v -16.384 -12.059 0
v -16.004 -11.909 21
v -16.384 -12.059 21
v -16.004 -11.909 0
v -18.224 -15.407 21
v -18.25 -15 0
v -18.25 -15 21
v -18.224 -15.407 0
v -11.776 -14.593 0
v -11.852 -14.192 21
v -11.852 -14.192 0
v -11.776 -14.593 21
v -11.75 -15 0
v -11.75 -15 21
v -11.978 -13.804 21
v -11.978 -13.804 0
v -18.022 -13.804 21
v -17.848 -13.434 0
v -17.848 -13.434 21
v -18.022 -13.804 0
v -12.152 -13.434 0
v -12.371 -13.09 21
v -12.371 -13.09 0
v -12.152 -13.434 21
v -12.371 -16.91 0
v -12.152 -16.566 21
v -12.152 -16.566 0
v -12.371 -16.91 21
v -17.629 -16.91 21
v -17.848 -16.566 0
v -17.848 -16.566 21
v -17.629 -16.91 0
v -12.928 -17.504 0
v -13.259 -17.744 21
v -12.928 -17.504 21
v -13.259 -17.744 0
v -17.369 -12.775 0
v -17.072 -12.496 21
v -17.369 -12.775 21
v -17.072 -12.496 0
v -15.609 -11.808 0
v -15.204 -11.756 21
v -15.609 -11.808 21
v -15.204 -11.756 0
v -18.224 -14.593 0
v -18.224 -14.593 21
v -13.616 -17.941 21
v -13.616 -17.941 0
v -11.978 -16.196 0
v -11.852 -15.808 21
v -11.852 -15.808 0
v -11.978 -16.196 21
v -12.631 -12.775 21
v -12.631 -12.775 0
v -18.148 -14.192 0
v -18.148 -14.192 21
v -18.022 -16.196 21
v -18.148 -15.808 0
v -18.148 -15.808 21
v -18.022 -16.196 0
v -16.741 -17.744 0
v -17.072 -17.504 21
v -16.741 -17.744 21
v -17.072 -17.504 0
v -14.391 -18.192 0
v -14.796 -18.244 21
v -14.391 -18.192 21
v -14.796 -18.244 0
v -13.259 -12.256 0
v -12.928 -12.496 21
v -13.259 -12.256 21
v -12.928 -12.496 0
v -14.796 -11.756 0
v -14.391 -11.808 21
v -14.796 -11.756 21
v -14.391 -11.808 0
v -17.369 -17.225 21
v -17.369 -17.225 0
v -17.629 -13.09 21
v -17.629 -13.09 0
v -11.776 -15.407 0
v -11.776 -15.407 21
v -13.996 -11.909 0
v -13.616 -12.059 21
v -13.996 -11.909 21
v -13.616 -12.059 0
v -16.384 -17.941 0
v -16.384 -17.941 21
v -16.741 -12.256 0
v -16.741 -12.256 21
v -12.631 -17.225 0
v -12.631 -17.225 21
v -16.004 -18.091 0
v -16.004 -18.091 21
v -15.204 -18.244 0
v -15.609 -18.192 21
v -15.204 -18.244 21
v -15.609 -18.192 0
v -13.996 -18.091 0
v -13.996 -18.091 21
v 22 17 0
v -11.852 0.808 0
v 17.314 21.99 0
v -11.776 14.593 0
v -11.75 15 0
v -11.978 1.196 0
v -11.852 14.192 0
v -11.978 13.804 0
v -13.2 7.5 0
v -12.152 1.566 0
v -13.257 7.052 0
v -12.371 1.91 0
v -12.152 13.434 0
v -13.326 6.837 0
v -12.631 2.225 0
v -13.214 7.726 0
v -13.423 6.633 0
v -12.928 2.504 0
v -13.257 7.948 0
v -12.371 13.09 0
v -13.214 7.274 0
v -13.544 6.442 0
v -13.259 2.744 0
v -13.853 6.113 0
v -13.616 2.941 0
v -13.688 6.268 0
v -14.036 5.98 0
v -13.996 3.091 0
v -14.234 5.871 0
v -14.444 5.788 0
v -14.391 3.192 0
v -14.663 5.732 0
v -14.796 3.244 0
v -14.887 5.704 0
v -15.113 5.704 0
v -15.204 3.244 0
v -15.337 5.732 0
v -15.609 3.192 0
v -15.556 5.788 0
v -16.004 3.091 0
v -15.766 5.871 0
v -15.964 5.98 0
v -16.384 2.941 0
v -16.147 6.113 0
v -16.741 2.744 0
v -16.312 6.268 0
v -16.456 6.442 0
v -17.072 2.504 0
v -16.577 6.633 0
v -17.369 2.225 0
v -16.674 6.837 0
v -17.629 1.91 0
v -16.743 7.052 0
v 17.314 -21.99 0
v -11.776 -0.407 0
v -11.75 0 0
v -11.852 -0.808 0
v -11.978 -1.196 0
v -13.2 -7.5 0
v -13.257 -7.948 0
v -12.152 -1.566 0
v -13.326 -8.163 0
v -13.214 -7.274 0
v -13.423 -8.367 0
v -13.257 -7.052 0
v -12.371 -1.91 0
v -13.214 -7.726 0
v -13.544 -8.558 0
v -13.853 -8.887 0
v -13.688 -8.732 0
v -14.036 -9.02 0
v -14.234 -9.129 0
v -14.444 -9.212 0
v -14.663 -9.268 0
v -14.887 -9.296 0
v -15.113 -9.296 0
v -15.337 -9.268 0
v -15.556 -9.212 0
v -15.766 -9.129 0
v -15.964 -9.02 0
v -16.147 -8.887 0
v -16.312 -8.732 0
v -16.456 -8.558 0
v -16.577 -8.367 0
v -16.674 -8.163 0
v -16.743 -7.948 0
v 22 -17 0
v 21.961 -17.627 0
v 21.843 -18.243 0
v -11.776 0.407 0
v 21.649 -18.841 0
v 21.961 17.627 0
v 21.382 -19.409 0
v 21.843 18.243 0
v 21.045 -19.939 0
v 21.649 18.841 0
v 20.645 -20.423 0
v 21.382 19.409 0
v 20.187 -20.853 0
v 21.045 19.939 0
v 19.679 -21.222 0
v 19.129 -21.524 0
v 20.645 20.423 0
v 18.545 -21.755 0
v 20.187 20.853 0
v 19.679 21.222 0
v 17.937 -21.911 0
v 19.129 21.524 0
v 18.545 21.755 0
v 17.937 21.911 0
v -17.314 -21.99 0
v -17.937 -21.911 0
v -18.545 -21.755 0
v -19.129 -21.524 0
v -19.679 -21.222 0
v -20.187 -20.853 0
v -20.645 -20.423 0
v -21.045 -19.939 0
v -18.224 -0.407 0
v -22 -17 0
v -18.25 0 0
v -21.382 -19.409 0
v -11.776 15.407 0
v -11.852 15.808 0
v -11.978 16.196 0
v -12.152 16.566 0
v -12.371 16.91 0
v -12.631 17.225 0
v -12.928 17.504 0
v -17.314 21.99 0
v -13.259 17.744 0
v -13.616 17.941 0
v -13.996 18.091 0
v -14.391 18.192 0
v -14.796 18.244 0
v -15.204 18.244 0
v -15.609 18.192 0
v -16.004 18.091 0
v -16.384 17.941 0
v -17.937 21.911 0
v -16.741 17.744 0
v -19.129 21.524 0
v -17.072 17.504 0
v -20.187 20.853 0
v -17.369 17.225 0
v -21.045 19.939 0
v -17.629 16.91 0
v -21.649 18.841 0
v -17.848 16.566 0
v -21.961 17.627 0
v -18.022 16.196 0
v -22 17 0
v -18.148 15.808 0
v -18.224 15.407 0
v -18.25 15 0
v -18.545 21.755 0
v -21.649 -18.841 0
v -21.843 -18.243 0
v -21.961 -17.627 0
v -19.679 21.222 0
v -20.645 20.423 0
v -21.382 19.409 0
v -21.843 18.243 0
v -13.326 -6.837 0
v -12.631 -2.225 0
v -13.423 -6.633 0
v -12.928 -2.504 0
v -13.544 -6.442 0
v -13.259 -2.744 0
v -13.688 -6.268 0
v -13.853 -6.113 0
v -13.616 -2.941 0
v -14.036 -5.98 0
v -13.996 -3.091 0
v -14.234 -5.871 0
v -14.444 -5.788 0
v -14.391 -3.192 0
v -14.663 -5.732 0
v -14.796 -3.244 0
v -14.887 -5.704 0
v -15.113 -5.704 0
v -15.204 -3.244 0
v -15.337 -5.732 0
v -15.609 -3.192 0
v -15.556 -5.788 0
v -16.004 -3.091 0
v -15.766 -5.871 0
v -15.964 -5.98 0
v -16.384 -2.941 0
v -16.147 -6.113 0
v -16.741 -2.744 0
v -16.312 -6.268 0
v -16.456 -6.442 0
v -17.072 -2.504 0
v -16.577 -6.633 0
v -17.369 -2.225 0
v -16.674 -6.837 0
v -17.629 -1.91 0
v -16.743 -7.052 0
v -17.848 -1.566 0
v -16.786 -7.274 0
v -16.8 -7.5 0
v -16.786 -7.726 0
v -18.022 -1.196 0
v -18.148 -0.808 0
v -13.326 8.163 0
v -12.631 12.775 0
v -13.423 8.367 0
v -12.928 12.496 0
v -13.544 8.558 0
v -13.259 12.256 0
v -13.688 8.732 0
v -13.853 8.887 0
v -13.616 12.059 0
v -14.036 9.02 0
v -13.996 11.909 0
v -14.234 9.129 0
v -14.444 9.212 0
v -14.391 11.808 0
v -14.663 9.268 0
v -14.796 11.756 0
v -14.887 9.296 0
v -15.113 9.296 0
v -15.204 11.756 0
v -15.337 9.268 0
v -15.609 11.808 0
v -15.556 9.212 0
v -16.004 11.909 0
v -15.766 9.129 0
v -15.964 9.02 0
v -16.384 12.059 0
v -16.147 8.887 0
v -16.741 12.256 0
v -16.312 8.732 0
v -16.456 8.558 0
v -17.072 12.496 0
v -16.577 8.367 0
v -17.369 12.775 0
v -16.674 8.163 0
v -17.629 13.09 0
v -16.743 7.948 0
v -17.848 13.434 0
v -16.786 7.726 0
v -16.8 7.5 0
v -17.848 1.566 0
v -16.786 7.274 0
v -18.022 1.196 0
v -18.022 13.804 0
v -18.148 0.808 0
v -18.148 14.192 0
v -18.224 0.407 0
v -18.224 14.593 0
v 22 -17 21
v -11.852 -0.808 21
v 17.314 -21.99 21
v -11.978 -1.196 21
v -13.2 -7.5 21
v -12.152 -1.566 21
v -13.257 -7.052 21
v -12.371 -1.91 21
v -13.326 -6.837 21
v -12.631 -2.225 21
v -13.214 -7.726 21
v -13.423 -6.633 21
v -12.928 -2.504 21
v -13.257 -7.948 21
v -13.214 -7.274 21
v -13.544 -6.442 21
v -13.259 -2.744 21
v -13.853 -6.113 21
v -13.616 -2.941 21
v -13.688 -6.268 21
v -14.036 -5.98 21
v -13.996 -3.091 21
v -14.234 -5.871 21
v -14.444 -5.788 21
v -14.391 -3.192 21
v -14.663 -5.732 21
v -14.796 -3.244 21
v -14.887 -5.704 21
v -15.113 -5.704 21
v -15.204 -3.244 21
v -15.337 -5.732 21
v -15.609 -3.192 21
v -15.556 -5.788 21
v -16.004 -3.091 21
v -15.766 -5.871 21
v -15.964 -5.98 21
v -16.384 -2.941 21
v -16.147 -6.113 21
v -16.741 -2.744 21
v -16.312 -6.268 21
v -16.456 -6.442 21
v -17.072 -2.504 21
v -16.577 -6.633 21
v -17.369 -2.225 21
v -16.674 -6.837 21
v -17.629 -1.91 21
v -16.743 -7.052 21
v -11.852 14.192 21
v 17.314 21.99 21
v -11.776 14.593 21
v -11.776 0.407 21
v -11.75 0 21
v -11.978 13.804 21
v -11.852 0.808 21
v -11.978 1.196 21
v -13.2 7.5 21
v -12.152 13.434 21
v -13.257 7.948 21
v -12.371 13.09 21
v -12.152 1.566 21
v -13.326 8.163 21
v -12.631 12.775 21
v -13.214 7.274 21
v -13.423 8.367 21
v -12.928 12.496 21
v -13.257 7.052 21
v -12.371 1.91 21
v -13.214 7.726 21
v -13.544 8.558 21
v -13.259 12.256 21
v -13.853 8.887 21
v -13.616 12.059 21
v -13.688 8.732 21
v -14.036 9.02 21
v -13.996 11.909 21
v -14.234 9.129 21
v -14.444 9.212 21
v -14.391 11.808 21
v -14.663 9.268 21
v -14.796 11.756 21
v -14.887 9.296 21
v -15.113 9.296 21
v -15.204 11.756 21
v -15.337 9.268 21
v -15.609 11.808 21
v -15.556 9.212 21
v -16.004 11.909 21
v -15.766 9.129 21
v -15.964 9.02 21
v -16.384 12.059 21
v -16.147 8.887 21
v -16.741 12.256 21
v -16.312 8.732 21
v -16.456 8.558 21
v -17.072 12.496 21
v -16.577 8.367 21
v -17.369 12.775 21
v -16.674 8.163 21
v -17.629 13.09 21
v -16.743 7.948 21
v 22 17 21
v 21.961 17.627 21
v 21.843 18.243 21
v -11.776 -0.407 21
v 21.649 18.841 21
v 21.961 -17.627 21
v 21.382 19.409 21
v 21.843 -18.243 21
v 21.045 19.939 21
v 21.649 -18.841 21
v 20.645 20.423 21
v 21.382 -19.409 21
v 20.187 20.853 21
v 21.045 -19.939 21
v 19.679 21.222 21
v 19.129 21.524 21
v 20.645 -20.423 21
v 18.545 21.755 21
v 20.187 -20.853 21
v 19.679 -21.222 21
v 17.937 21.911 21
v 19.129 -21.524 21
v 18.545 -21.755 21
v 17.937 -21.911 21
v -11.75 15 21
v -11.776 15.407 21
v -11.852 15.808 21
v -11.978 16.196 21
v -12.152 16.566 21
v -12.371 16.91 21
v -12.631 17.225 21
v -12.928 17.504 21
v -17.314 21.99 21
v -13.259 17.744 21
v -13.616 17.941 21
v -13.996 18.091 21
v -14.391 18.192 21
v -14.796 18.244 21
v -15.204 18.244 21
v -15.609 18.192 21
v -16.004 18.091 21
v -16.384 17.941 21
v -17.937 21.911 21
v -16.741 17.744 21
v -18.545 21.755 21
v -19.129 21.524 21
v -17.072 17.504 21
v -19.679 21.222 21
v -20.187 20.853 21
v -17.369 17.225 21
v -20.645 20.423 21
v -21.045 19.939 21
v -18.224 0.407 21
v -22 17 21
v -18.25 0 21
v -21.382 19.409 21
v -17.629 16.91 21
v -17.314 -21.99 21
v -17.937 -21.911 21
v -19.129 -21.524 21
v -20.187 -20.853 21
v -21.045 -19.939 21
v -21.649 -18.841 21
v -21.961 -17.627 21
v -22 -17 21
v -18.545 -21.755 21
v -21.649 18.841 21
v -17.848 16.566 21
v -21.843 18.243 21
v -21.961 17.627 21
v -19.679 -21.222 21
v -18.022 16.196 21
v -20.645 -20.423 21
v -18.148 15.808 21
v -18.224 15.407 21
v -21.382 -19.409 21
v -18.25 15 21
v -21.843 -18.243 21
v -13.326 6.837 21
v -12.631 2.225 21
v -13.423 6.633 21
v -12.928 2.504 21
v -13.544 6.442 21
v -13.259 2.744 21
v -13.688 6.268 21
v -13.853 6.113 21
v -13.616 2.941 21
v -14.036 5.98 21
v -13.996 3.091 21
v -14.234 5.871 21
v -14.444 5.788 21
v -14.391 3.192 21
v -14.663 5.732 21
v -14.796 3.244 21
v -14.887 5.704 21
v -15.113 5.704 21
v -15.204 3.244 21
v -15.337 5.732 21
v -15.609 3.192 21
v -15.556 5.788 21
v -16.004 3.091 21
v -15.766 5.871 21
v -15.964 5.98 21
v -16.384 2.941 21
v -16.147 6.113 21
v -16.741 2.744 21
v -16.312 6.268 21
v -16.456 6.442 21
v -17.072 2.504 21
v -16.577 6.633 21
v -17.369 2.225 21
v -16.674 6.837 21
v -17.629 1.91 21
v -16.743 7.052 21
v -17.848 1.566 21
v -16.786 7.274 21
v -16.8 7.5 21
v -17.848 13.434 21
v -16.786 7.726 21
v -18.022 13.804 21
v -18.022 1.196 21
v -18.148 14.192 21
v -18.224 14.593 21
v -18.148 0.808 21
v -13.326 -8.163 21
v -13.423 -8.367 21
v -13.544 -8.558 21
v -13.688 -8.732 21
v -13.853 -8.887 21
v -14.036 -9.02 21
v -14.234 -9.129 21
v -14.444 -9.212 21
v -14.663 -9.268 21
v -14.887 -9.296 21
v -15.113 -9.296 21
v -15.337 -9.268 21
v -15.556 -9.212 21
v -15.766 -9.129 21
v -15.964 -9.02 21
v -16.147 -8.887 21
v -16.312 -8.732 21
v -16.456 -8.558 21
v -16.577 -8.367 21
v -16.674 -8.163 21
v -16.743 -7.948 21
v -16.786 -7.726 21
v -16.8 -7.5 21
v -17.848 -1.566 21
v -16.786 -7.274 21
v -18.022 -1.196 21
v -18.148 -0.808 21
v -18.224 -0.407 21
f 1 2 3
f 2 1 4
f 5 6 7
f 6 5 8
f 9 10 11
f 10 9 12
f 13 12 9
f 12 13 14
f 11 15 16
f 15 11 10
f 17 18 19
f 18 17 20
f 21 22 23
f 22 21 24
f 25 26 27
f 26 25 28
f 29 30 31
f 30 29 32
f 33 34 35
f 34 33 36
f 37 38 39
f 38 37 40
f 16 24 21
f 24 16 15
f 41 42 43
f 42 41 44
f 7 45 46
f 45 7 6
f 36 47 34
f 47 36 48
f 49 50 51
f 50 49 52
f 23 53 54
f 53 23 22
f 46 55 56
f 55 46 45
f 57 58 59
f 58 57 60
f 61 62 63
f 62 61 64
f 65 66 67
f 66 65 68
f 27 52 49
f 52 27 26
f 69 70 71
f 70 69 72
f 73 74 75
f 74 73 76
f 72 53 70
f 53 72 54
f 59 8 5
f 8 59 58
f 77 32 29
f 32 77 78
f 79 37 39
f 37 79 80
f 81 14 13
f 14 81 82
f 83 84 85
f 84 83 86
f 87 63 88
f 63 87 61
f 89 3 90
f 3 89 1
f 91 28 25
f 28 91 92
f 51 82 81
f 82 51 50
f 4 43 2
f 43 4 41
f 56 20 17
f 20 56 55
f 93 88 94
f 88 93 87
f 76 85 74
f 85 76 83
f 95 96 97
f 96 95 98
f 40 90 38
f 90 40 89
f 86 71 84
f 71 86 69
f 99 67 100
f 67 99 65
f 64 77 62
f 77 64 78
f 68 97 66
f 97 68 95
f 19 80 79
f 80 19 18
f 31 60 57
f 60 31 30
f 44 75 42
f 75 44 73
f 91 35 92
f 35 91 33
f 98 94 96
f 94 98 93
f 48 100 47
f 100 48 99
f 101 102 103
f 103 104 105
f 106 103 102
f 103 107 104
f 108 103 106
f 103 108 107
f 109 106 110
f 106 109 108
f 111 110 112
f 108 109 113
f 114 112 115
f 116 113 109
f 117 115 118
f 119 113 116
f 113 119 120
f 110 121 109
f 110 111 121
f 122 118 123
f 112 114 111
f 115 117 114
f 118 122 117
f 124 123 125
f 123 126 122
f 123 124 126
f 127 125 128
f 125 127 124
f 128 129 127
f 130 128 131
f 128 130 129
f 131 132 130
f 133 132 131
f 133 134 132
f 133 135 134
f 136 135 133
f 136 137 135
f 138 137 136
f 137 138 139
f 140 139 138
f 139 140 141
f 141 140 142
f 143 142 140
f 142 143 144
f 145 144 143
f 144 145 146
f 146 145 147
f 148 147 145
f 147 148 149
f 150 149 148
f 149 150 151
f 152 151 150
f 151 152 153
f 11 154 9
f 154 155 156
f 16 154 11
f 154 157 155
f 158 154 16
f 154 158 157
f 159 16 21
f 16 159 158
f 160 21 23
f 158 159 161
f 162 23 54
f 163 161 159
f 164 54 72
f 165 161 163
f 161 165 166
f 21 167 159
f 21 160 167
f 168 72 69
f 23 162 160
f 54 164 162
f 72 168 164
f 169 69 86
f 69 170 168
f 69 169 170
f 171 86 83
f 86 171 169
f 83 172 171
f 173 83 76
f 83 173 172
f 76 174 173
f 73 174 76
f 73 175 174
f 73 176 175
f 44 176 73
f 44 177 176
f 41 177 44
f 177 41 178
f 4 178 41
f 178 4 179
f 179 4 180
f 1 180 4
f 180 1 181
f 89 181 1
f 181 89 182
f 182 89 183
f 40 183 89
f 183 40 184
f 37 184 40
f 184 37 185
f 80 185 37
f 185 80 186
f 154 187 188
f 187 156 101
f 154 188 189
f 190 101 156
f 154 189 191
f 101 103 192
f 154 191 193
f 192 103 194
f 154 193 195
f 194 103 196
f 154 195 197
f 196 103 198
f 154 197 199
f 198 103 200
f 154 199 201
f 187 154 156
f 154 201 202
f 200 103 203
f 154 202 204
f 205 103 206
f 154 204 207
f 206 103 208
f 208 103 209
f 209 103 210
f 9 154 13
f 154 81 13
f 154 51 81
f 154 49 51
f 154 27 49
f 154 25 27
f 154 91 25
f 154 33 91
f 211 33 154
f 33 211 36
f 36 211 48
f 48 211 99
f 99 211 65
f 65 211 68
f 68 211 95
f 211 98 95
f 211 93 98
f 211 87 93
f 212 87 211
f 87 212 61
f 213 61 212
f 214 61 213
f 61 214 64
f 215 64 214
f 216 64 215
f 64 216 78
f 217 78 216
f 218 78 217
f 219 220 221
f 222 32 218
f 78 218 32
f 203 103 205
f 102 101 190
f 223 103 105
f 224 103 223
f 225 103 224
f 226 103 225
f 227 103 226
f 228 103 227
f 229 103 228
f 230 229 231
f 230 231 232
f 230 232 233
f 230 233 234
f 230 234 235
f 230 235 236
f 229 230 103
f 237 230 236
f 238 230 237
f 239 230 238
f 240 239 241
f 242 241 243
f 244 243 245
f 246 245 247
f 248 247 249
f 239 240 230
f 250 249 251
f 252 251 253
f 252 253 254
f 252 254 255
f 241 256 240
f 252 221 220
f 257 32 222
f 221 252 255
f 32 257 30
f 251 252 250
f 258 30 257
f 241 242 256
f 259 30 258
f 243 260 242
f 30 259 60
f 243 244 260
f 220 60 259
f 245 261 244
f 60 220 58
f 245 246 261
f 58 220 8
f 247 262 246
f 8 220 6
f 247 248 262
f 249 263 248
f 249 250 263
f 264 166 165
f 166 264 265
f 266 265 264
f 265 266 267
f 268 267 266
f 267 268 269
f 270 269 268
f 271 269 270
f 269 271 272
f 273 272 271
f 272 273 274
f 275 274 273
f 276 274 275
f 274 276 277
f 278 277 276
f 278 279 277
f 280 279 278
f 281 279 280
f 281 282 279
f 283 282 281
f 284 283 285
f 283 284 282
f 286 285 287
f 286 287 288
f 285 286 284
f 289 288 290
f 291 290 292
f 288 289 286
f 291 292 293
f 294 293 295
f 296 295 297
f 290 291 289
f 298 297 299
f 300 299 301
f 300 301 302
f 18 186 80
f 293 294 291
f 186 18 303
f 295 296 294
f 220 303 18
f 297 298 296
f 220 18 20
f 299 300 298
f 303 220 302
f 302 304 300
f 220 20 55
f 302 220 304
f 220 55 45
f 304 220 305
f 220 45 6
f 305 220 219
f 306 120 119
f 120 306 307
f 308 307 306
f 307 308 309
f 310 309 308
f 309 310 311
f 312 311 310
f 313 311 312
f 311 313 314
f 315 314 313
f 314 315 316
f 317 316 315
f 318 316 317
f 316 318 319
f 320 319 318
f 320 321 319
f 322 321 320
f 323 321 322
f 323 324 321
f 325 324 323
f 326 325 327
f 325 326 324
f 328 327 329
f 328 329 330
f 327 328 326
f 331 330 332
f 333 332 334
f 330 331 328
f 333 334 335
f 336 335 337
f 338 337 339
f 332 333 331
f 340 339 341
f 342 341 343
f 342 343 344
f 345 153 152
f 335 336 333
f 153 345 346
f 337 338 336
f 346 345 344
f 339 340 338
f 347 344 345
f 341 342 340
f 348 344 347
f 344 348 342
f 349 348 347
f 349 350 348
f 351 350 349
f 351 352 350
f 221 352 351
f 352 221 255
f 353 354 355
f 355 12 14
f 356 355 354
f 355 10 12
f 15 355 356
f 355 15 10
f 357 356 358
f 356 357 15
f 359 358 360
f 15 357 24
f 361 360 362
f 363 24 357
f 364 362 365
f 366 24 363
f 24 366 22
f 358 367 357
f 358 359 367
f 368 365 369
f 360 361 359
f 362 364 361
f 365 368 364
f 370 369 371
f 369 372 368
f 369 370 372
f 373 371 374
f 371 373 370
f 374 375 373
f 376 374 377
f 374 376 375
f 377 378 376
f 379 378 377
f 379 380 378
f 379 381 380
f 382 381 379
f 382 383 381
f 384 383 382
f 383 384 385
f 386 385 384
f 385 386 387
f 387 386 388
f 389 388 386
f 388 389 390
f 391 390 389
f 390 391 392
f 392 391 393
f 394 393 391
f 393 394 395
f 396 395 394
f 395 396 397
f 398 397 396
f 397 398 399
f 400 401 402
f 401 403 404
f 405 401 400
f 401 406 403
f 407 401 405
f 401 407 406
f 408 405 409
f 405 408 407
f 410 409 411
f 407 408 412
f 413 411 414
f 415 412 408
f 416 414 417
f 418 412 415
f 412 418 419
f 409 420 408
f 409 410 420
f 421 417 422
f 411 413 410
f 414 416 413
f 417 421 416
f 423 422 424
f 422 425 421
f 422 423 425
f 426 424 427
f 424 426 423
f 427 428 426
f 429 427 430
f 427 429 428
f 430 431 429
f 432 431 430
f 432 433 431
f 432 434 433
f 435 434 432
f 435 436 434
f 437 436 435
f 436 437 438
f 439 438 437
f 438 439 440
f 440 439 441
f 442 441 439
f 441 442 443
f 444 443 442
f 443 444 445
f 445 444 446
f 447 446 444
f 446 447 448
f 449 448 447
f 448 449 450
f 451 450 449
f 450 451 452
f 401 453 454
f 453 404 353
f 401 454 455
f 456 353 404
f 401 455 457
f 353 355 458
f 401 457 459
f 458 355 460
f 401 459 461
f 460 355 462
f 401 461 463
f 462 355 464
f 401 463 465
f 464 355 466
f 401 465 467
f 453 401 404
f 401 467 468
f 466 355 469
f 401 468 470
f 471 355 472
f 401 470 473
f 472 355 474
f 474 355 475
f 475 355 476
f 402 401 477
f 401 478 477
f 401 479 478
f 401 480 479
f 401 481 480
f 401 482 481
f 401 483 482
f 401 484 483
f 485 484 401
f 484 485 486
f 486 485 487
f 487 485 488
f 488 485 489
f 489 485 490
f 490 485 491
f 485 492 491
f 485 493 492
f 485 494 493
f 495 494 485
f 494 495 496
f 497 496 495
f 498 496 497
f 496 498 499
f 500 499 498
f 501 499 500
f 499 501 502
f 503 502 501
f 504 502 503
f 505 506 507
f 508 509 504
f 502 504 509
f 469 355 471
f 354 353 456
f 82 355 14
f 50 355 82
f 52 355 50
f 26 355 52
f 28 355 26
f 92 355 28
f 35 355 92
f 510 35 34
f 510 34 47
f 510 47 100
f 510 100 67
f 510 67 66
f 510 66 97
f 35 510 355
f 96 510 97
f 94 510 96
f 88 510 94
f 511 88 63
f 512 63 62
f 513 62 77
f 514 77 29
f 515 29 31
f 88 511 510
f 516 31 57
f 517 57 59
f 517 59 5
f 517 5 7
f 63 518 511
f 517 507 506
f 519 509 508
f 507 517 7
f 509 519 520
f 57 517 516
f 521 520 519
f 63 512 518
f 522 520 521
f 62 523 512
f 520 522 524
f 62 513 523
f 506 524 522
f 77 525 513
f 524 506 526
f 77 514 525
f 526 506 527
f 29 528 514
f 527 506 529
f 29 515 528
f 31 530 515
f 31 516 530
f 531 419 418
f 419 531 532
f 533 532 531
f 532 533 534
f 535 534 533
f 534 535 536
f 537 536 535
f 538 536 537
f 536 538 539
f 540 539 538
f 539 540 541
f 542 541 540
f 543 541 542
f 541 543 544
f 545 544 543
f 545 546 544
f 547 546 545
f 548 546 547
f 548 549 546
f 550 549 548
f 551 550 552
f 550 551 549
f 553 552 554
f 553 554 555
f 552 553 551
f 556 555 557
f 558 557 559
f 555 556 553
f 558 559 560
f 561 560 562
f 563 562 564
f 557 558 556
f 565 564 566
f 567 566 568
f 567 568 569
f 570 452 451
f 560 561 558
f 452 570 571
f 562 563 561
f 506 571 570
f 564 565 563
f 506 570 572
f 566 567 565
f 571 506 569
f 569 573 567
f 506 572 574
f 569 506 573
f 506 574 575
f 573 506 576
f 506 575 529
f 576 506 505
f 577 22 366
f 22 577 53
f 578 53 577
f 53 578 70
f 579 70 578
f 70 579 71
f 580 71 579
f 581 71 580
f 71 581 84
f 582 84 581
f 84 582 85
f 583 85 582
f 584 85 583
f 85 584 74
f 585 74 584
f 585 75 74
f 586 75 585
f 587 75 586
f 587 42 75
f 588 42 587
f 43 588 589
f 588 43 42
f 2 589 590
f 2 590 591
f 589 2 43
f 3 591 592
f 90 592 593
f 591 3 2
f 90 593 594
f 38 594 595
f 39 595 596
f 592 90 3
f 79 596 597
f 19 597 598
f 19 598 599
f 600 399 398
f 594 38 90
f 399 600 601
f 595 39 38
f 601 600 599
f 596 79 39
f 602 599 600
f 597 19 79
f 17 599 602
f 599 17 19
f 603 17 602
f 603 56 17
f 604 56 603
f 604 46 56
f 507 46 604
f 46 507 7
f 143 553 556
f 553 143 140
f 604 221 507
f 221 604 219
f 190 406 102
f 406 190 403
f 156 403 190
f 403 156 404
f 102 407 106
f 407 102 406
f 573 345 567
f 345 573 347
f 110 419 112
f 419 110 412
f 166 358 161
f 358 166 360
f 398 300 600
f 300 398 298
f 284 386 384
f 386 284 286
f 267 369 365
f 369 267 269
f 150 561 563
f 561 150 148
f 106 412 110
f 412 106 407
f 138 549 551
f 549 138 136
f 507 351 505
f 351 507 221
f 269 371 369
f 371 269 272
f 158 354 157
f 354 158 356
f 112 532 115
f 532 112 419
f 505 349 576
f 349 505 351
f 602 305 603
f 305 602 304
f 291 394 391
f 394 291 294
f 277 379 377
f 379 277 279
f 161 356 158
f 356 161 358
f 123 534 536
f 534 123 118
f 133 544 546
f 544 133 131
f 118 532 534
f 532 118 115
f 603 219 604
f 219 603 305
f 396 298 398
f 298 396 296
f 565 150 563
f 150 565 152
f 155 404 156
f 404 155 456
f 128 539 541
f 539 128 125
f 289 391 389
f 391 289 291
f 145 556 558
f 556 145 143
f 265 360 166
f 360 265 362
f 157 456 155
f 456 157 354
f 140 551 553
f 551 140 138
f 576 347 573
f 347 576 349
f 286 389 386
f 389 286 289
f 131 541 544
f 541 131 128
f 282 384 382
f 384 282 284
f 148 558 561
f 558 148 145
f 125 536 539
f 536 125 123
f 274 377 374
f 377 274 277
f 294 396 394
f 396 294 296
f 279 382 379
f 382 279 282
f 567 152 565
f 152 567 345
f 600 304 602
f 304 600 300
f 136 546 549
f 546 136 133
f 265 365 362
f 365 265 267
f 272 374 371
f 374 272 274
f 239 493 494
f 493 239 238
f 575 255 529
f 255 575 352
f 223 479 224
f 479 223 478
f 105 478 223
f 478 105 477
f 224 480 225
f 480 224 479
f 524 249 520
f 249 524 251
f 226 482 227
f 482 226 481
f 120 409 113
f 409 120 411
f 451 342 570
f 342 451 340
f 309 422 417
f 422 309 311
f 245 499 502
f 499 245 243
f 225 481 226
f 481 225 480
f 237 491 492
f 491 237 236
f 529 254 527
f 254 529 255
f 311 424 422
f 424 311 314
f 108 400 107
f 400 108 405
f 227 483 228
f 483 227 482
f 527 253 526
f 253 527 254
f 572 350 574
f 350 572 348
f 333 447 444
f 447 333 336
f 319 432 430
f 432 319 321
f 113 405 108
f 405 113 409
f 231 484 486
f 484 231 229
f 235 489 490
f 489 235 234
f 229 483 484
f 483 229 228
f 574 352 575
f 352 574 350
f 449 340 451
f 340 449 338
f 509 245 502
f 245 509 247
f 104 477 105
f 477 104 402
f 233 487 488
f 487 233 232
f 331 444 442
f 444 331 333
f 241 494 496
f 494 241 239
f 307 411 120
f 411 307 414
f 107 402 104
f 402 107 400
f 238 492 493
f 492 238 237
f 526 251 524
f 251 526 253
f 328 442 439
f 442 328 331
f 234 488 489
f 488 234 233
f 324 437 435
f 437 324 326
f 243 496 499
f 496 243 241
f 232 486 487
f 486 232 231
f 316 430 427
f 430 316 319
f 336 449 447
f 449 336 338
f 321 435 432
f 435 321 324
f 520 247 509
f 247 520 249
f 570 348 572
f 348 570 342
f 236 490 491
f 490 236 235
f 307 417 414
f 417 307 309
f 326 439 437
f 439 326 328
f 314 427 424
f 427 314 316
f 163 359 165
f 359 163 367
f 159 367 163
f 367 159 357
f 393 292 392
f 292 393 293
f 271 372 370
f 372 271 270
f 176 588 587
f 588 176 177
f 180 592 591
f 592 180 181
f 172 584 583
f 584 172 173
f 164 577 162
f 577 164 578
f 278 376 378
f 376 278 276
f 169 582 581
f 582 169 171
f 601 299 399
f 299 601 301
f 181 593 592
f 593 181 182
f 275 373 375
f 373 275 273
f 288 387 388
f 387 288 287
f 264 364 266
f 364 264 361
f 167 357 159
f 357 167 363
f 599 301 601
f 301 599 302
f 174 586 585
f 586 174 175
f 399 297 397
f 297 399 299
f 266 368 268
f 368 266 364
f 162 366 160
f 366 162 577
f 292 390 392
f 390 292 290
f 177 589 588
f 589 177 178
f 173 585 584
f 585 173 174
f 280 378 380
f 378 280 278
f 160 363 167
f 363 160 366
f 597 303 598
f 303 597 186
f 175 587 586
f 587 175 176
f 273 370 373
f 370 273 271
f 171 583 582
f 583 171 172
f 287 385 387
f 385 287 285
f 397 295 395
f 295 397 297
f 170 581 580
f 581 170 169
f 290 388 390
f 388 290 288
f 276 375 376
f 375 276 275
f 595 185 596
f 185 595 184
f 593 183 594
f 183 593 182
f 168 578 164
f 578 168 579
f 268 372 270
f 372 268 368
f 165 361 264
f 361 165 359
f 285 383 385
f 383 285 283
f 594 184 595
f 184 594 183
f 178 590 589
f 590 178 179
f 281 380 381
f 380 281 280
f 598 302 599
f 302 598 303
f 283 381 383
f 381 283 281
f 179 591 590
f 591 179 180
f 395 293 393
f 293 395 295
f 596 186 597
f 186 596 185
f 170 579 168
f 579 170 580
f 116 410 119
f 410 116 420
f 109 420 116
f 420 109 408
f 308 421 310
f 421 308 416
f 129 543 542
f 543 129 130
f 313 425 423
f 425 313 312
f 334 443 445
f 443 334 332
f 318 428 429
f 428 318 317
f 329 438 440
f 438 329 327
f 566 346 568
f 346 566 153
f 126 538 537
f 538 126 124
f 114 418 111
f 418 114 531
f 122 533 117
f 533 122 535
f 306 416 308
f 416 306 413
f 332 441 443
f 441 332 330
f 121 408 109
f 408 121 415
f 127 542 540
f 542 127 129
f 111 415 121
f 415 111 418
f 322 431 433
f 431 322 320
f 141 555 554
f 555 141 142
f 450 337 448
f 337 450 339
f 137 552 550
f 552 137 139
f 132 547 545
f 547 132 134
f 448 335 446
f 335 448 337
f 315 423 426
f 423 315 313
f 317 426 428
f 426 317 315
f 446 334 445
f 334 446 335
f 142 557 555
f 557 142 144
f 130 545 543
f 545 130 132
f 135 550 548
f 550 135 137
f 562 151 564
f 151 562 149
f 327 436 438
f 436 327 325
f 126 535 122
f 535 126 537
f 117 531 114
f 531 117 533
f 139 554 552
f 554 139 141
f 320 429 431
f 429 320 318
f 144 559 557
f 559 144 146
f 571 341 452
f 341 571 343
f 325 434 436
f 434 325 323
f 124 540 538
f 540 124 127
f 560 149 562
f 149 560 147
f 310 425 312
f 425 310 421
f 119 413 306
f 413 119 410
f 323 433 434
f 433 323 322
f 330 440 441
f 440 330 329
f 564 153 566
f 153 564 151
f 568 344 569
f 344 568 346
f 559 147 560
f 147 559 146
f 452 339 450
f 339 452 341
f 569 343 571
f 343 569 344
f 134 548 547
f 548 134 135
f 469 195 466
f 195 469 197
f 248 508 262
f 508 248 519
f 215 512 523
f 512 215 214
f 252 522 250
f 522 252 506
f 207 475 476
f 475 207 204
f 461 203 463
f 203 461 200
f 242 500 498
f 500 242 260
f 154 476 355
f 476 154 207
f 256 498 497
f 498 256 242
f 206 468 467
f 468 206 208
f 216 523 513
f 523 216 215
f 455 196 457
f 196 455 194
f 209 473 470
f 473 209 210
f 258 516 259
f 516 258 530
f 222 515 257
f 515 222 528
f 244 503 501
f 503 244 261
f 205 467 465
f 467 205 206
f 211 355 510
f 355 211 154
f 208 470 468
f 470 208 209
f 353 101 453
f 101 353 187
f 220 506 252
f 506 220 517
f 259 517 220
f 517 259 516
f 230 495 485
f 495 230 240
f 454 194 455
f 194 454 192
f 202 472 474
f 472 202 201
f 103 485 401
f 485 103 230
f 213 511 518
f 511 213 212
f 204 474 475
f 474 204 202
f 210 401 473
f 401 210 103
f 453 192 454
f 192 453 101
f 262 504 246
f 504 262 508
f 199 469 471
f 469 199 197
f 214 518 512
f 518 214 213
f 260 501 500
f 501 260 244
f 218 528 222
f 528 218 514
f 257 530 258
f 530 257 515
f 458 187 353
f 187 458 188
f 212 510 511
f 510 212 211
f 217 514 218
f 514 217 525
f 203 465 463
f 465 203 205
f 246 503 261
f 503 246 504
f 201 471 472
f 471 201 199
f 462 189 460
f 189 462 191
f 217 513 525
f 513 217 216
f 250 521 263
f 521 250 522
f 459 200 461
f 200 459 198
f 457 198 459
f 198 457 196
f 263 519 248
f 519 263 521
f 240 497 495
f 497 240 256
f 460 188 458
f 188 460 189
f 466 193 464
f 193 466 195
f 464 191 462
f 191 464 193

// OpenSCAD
$fn = 50;


difference() {
	union() {
		hull() {
			translate(v = [-17.0000000000, 17.0000000000, 0]) {
				cylinder(h = 21, r = 5);
			}
			translate(v = [17.0000000000, 17.0000000000, 0]) {
				cylinder(h = 21, r = 5);
			}
			translate(v = [-17.0000000000, -17.0000000000, 0]) {
				cylinder(h = 21, r = 5);
			}
			translate(v = [17.0000000000, -17.0000000000, 0]) {
				cylinder(h = 21, r = 5);
			}
		}
	}
	union() {
		translate(v = [-15.0000000000, -15.0000000000, 0]) {
			cylinder(h = 21, r = 3.2500000000);
		}
		translate(v = [-15.0000000000, 0.0000000000, 0]) {
			cylinder(h = 21, r = 3.2500000000);
		}
		translate(v = [-15.0000000000, 15.0000000000, 0]) {
			cylinder(h = 21, r = 3.2500000000);
		}
		translate(v = [-15.0000000000, -15.0000000000, 0]) {
			cylinder(h = 21, r = 1.8000000000);
		}
		translate(v = [-15.0000000000, -7.5000000000, 0]) {
			cylinder(h = 21, r = 1.8000000000);
		}
		translate(v = [-15.0000000000, 0.0000000000, 0]) {
			cylinder(h = 21, r = 1.8000000000);
		}
		translate(v = [-15.0000000000, 7.5000000000, 0]) {
			cylinder(h = 21, r = 1.8000000000);
		}
		translate(v = [-15.0000000000, 15.0000000000, 0]) {
			cylinder(h = 21, r = 1.8000000000);
		}
		translate(v = [-15.0000000000, -15.0000000000, 0]) {
			cylinder(h = 21, r = 1.8000000000);
		}
		translate(v = [-15.0000000000, -7.5000000000, 0]) {
			cylinder(h = 21, r = 1.8000000000);
		}
		translate(v = [-15.0000000000, 0.0000000000, 0]) {
			cylinder(h = 21, r = 1.8000000000);
		}
		translate(v = [-15.0000000000, 7.5000000000, 0]) {
			cylinder(h = 21, r = 1.8000000000);
		}
		translate(v = [-15.0000000000, 15.0000000000, 0]) {
			cylinder(h = 21, r = 1.8000000000);
		}
		translate(v = [-15.0000000000, -15.0000000000, 0]) {
			cylinder(h = 21, r = 1.8000000000);
		}
		translate(v = [-15.0000000000, -7.5000000000, 0]) {
			cylinder(h = 21, r = 1.8000000000);
		}
		translate(v = [-15.0000000000, 0.0000000000, 0]) {
			cylinder(h = 21, r = 1.8000000000);
		}
		translate(v = [-15.0000000000, 7.5000000000, 0]) {
			cylinder(h = 21, r = 1.8000000000);
		}
		translate(v = [-15.0000000000, 15.0000000000, 0]) {
			cylinder(h = 21, r = 1.8000000000);
		}
	}
}
